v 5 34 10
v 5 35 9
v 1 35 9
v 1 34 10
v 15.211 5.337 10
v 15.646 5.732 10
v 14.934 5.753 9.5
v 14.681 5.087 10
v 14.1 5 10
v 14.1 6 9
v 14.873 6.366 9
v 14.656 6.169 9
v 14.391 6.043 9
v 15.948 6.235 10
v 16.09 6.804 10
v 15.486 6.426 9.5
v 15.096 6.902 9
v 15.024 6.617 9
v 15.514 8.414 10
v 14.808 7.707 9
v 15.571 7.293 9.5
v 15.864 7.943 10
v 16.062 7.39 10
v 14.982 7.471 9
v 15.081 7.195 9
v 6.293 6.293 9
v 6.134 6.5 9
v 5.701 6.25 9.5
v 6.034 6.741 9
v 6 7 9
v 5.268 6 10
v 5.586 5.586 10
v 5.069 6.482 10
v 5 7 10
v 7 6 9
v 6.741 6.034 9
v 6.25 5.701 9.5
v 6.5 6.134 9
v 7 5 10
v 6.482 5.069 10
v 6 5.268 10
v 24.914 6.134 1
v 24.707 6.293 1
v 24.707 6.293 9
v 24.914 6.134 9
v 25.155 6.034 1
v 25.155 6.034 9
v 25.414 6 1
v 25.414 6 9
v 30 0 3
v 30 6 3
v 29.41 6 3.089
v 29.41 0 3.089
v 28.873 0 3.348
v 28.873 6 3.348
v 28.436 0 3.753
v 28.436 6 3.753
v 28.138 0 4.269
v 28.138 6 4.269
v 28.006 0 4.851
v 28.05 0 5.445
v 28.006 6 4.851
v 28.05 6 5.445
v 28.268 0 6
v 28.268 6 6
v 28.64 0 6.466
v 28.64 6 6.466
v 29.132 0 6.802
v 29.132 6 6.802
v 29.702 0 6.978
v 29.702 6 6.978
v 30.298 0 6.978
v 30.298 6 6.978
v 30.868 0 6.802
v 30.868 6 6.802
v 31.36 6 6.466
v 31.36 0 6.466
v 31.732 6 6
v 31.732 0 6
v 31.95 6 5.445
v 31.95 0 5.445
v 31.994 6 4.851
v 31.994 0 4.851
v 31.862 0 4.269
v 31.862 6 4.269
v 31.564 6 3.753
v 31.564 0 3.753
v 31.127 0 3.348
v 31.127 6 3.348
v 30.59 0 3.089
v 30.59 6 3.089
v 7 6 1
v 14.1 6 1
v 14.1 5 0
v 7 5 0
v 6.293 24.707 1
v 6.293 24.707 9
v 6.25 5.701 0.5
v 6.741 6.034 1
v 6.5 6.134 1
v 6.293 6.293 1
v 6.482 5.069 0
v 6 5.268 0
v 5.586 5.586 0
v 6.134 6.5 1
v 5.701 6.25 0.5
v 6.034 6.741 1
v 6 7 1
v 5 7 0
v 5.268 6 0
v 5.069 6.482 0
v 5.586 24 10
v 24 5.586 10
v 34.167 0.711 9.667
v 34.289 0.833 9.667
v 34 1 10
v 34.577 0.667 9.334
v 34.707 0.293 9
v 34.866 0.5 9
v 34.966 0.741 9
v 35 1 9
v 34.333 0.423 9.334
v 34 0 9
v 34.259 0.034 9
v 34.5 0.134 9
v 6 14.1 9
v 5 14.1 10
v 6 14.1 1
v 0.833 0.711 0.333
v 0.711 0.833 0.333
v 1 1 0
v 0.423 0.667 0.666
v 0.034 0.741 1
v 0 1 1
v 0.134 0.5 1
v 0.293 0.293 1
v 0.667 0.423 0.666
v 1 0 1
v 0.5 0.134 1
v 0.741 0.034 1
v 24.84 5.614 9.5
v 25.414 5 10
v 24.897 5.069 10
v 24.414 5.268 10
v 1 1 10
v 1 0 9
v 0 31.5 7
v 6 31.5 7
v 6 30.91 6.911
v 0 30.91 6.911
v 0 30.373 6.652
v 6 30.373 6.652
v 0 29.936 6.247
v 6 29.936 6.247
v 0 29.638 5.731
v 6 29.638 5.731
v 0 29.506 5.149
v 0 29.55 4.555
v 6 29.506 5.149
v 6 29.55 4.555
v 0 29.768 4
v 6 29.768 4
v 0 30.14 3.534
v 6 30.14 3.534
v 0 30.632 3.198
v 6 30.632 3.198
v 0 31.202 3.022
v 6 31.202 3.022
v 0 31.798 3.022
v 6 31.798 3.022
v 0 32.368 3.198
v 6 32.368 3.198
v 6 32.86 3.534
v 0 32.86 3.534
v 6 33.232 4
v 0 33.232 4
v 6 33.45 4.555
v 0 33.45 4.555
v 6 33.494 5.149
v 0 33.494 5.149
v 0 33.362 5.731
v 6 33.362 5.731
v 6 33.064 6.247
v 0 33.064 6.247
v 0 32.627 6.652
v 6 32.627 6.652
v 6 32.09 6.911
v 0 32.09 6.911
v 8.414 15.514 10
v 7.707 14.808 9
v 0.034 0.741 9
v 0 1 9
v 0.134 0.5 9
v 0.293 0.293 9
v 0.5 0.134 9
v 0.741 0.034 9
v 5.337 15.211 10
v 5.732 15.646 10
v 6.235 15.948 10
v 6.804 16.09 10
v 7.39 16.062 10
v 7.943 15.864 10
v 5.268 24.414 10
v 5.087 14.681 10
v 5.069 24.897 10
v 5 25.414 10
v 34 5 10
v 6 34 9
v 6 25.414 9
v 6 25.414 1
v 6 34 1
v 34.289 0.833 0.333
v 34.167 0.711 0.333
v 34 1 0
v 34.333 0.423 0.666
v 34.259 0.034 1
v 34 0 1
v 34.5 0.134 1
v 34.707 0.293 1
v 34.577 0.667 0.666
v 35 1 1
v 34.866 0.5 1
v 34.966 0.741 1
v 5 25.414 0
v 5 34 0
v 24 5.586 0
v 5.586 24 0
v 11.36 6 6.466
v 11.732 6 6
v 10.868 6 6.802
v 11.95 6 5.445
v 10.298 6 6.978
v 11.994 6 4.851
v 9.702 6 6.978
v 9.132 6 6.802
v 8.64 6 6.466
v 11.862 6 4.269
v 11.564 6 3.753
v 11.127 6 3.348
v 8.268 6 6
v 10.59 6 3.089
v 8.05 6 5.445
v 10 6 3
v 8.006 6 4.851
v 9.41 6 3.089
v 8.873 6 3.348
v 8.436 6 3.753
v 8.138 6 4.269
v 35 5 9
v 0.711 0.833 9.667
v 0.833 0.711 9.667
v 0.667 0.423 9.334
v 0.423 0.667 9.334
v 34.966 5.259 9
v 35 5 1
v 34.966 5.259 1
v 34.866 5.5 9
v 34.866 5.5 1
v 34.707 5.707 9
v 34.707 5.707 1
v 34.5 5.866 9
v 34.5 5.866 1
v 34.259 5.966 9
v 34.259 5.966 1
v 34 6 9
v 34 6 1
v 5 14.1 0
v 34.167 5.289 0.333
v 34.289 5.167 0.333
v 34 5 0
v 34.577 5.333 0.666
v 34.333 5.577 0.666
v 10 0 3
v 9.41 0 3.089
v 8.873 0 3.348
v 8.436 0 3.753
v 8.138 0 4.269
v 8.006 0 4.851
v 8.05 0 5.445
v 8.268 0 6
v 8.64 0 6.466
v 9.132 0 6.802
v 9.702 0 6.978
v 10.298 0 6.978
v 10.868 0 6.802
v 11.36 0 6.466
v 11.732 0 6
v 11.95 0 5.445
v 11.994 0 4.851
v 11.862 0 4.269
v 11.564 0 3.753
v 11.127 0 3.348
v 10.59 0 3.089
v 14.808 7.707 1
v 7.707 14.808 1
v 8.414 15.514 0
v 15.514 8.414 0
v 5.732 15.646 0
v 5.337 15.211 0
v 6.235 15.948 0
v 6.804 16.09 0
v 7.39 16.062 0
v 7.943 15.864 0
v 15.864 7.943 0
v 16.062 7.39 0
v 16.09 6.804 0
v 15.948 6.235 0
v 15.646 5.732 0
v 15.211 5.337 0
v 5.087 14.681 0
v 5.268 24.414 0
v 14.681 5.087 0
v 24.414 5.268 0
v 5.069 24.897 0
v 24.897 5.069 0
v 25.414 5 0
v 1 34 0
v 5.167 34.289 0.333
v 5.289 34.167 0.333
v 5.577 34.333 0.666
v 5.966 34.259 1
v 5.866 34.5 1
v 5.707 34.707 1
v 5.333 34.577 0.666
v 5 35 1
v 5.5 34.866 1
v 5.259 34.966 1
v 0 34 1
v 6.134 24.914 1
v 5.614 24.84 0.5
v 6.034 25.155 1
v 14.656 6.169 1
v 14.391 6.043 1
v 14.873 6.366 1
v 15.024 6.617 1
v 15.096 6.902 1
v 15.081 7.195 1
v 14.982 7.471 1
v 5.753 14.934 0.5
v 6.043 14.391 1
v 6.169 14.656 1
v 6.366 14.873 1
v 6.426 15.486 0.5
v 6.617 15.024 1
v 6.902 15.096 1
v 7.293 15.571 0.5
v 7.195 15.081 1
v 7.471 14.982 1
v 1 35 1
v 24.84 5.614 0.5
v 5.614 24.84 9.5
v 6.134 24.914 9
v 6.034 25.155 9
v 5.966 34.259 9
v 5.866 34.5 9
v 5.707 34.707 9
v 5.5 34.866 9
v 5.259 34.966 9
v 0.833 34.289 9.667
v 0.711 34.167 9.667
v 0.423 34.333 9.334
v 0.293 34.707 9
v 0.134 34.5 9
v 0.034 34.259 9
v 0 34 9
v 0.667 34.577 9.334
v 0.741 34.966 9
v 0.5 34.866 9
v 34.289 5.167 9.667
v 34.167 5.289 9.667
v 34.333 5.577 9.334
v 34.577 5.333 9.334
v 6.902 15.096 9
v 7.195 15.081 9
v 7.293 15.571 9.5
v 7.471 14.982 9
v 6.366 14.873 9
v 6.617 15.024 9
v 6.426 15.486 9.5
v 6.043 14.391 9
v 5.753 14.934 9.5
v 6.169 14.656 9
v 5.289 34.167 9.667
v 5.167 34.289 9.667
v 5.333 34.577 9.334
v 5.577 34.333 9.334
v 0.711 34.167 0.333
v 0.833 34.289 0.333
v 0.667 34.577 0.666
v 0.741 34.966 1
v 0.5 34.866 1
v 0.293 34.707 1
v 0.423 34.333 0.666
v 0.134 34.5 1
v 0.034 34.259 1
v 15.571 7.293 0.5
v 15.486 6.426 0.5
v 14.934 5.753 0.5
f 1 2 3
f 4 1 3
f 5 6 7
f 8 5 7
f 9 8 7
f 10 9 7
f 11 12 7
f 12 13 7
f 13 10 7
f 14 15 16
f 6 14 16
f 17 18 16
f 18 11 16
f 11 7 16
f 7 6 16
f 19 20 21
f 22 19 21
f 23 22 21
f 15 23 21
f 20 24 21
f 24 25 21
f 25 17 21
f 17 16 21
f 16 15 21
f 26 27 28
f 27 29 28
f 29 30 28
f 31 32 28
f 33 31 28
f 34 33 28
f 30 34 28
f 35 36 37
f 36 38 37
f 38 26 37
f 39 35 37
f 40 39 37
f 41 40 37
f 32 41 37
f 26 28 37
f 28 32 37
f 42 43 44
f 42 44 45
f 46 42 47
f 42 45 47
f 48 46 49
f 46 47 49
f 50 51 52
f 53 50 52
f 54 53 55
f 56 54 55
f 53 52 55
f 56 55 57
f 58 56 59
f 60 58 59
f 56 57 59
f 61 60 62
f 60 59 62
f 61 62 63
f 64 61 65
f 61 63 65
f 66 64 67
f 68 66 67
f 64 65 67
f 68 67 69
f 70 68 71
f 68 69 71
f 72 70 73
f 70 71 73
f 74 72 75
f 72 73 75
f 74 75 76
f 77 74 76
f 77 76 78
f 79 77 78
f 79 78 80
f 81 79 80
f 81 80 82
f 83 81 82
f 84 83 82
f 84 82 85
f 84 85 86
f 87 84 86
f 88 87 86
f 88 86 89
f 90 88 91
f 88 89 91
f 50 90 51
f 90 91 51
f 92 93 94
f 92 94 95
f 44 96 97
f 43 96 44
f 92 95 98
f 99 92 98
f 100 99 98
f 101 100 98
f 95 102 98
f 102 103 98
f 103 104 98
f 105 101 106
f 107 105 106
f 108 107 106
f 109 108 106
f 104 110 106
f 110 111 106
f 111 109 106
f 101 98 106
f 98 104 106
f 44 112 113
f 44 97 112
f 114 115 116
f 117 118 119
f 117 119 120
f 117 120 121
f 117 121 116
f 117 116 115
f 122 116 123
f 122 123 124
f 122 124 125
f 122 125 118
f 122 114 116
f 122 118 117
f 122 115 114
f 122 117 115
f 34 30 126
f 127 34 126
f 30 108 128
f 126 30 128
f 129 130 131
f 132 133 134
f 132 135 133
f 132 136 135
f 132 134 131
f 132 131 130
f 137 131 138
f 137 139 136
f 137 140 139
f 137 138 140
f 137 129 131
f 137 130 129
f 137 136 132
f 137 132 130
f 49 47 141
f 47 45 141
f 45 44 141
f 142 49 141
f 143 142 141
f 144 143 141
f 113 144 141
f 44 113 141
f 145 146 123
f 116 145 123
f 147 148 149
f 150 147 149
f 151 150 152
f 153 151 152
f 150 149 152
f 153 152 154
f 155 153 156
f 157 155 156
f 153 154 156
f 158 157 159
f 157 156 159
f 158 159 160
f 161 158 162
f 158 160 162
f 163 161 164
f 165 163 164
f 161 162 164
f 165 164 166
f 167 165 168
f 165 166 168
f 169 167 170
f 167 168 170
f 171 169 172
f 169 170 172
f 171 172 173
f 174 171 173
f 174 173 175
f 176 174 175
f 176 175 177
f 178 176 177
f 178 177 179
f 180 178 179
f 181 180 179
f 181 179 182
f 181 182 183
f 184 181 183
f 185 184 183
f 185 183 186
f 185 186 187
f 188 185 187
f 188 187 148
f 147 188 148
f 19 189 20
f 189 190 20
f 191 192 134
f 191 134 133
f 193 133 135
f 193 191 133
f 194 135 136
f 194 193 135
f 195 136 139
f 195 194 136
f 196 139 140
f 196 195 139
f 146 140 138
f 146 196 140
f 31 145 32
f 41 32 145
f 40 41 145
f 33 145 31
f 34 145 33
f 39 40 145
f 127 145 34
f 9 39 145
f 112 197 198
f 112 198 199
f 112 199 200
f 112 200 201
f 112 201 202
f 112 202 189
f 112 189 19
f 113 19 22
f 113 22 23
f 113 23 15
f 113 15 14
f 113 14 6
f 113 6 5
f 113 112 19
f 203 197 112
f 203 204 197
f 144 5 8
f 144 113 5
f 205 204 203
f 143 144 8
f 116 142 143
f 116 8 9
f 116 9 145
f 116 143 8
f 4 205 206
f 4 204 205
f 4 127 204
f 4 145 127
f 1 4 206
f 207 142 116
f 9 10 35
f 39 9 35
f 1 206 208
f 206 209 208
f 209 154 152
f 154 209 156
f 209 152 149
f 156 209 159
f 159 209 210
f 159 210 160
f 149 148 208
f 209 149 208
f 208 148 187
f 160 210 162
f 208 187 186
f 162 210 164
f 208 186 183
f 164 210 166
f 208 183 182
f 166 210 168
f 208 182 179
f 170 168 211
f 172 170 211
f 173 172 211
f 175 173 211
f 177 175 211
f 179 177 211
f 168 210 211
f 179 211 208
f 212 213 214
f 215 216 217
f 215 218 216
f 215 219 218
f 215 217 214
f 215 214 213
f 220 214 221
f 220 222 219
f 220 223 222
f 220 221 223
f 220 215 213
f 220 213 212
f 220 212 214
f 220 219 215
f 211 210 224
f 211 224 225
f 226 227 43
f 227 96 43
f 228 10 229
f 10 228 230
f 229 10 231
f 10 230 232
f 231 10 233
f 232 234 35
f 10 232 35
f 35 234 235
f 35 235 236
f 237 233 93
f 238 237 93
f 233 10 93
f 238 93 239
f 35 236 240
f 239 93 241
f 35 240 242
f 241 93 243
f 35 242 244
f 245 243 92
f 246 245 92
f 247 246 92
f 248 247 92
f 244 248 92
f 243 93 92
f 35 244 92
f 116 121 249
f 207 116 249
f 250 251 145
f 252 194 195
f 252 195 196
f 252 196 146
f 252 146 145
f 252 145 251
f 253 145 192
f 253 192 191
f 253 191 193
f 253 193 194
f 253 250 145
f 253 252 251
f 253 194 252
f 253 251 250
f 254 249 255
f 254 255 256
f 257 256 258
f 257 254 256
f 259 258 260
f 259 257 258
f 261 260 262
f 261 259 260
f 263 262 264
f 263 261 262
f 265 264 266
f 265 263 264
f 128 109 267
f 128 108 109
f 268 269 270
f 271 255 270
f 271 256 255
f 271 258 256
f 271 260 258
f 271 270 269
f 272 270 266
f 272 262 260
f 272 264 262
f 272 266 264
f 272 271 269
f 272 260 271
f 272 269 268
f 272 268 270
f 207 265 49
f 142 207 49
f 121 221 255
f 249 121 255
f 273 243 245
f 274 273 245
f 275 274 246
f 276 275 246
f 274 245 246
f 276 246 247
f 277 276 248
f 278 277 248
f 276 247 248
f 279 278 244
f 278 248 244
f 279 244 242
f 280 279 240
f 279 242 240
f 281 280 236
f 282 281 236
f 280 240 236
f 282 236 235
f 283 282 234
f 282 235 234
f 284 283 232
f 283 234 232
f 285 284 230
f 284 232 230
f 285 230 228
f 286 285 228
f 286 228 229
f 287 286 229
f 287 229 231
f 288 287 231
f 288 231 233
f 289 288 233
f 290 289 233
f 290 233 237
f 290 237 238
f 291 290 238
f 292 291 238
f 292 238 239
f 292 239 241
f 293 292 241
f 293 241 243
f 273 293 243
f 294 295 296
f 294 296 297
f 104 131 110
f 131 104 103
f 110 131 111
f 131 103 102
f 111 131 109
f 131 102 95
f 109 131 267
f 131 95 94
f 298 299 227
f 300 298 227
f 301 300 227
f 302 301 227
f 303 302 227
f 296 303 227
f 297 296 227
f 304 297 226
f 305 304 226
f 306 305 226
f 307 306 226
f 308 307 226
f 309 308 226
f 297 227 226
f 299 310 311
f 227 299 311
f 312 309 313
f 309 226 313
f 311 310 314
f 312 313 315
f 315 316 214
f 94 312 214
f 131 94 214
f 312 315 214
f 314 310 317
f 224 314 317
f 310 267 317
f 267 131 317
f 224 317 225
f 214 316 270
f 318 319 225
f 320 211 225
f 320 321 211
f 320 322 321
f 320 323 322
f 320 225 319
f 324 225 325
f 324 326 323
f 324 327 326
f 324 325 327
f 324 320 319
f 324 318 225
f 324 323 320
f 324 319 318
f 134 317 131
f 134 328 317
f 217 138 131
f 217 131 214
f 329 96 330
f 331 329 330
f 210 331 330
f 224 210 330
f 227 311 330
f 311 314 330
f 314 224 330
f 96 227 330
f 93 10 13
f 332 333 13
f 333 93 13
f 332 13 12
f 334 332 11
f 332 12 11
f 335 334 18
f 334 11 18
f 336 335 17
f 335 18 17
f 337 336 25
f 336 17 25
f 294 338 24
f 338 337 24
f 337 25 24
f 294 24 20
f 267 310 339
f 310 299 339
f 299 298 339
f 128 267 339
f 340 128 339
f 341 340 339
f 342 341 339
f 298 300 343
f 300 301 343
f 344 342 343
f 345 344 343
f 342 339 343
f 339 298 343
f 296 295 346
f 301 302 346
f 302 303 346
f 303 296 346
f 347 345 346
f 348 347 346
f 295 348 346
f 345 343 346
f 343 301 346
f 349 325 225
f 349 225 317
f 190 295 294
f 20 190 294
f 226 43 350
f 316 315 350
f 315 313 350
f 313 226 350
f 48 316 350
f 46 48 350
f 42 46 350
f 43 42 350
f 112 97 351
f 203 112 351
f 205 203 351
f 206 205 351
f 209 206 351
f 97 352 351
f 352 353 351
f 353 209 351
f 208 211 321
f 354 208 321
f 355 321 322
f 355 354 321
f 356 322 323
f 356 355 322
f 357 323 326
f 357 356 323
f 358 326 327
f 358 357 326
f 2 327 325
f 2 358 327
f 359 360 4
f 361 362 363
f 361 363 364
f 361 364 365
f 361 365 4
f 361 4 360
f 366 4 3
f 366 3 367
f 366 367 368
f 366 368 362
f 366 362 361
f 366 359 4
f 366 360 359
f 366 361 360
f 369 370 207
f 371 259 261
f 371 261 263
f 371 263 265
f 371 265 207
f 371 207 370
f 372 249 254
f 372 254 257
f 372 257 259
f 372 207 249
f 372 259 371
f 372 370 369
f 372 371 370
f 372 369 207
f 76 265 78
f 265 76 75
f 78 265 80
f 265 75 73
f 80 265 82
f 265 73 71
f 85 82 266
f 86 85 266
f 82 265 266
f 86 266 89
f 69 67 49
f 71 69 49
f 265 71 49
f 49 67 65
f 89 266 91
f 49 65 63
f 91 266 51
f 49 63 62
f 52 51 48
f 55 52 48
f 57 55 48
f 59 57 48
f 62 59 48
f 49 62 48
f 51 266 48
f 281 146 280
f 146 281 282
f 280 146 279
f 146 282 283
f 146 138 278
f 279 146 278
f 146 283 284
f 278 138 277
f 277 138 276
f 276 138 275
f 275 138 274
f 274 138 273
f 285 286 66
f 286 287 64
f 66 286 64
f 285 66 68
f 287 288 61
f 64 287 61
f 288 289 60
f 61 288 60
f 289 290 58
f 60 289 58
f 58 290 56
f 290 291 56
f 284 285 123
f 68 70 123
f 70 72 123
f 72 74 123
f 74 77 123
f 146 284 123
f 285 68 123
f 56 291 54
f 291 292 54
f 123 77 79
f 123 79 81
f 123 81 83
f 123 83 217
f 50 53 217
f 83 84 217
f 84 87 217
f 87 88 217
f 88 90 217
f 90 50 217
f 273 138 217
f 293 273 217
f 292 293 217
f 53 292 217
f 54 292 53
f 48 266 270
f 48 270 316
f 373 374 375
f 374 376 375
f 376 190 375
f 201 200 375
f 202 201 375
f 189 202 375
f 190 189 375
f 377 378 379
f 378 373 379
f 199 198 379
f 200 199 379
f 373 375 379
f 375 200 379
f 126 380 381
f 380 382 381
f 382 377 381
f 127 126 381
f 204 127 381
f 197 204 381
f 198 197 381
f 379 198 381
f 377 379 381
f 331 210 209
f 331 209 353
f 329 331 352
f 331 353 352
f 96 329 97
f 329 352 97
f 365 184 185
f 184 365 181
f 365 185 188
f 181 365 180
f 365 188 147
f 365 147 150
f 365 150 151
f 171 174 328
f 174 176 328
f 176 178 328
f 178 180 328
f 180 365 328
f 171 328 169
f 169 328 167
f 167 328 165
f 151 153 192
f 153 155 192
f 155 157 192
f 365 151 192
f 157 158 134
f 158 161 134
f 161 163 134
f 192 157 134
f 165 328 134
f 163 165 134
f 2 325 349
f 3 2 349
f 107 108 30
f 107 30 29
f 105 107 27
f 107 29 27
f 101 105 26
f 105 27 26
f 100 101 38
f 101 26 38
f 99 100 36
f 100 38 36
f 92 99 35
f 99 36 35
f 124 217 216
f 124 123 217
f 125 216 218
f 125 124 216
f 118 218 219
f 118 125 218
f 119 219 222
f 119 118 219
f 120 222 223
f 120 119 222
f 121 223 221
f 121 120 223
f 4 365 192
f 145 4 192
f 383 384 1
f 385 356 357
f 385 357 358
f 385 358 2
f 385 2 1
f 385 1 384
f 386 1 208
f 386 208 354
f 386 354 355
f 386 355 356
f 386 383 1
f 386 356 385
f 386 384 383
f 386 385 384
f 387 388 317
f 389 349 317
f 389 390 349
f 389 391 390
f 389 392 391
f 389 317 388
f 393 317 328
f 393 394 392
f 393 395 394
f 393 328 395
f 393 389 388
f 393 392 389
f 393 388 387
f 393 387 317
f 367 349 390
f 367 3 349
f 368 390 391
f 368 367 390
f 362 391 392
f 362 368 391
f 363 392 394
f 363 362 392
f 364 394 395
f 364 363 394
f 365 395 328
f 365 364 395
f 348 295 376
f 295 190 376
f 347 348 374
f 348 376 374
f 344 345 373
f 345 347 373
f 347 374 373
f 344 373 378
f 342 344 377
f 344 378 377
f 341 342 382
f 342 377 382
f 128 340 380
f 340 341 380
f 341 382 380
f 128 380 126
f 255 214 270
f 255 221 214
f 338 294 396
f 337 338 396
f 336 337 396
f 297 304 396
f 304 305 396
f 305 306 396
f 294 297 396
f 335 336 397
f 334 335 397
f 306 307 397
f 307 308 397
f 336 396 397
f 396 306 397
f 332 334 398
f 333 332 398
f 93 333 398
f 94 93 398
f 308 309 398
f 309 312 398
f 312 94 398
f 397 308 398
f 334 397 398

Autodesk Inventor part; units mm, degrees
ref_plane "YZ Plane" through (0, 0, 0) normal (1, 0, 0) x (0, 1, 0)
ref_plane "XZ Plane" through (0, 0, 0) normal (0, 1, 0) x (-1, 0, 0)
ref_plane "XY Plane" through (0, 0, 0) normal (0, 0, 1) x (1, 0, 0)
sketch "Sketch1" plane through (0, 0, 0) normal (0, 0, 1) x (1, 0, 0)
  line L0 (0, 35) -> (0, 0)
  line L1 (0, 0) -> (35, 0)
  line L2 (35, 0) -> (35, 6)
  line L3 (35, 6) -> (6, 6)
  line L4 (6, 6) -> (6, 35)
  line L5 (6, 35) -> (0, 35)
  line L6 (6, 25) -> (25, 6)
  line L7 (6, 16.5147) -> (16.5147, 6)
  dimension "d0" = 6
  dimension "d1" = 35
  dimension "d5" = 45
  dimension "d6" = 10
  dimension "d24" = 6
extrude "Extrusion1" add sketch "Sketch1" along normal blind 10 contours L5 L4 L3 L2 L1 L0 | L6 L3 L7 L4
sketch "Sketch2" plane through (0, 0, 0) normal (0, -1, 0) x (1, 0, 0)
  line L0 (35, 0) -> (35, 10) projected
  point P0 (0, 0)
  point P1 (30, 5)
  point P2 (10, 5)
  point P3 (35, 5)
  dimension "d7" = 5
  dimension "d8" = 20
hole "Hole1" at (30, 0, 5) at (10, 0, 5) direction (0, 1, 0) diameter 4 depth 8
sketch "Sketch3" plane through (0, 0, 0) normal (-1, 0, 0) x (0, 0, 1)
  line L0 (0, 35) -> (10, 35) projected
  line L1 (0, 0) -> (10, 0) projected
  point P0 (5, 31.5)
  point P1 (5, 35)
  dimension "d16" = 31.5
hole "Hole2" at (0, 31.5, 5) direction (1, 0, 0) diameter 4 depth 8
fillet "Fillet1" radius 1 10 edges at (0, 35, 5) (6, 35, 5) (0, 0, 5) (35, 0, 5) (35, 6, 5) (25, 6, 5) (6, 25, 5) (6, 6, 5) (6, 16.5147, 5) (16.5147, 6, 5)
chamfer "Chamfer1" distance 1 angle 45 36 edges at (0, 17.5, 10) (0.2929, 0.2929, 10) (17.5, 0, 10) (34.7071, 0.2929, 10) (35, 3, 10) (34.7071, 5.7071, 10) (29.7071, 6, 10) (25.0315, 6.0761, 10) (15.5, 15.5, 10) (6.0761, 25.0315, 10) (6, 29.7071, 10) (5.7071, 34.7071, 10) (3, 35, 10) (0.2929, 34.7071, 10) (11.2574, 11.2574, 10) (10.5503, 6, 10) (6.2929, 6.2929, 10) (6, 10.5503, 10) (6, 10.5503, 0) (11.2574, 11.2574, 0) (10.5503, 6, 0) (6.2929, 6.2929, 0) (0, 17.5, 0) (0.2929, 0.2929, 0) (17.5, 0, 0) (34.7071, 0.2929, 0) (35, 3, 0) (34.7071, 5.7071, 0) (29.7071, 6, 0) (25.0315, 6.0761, 0) (15.5, 15.5, 0) (6.0761, 25.0315, 0) (6, 29.7071, 0) (5.7071, 34.7071, 0) (3, 35, 0) (0.2929, 34.7071, 0)
properties part number "Control Board Bracket"
